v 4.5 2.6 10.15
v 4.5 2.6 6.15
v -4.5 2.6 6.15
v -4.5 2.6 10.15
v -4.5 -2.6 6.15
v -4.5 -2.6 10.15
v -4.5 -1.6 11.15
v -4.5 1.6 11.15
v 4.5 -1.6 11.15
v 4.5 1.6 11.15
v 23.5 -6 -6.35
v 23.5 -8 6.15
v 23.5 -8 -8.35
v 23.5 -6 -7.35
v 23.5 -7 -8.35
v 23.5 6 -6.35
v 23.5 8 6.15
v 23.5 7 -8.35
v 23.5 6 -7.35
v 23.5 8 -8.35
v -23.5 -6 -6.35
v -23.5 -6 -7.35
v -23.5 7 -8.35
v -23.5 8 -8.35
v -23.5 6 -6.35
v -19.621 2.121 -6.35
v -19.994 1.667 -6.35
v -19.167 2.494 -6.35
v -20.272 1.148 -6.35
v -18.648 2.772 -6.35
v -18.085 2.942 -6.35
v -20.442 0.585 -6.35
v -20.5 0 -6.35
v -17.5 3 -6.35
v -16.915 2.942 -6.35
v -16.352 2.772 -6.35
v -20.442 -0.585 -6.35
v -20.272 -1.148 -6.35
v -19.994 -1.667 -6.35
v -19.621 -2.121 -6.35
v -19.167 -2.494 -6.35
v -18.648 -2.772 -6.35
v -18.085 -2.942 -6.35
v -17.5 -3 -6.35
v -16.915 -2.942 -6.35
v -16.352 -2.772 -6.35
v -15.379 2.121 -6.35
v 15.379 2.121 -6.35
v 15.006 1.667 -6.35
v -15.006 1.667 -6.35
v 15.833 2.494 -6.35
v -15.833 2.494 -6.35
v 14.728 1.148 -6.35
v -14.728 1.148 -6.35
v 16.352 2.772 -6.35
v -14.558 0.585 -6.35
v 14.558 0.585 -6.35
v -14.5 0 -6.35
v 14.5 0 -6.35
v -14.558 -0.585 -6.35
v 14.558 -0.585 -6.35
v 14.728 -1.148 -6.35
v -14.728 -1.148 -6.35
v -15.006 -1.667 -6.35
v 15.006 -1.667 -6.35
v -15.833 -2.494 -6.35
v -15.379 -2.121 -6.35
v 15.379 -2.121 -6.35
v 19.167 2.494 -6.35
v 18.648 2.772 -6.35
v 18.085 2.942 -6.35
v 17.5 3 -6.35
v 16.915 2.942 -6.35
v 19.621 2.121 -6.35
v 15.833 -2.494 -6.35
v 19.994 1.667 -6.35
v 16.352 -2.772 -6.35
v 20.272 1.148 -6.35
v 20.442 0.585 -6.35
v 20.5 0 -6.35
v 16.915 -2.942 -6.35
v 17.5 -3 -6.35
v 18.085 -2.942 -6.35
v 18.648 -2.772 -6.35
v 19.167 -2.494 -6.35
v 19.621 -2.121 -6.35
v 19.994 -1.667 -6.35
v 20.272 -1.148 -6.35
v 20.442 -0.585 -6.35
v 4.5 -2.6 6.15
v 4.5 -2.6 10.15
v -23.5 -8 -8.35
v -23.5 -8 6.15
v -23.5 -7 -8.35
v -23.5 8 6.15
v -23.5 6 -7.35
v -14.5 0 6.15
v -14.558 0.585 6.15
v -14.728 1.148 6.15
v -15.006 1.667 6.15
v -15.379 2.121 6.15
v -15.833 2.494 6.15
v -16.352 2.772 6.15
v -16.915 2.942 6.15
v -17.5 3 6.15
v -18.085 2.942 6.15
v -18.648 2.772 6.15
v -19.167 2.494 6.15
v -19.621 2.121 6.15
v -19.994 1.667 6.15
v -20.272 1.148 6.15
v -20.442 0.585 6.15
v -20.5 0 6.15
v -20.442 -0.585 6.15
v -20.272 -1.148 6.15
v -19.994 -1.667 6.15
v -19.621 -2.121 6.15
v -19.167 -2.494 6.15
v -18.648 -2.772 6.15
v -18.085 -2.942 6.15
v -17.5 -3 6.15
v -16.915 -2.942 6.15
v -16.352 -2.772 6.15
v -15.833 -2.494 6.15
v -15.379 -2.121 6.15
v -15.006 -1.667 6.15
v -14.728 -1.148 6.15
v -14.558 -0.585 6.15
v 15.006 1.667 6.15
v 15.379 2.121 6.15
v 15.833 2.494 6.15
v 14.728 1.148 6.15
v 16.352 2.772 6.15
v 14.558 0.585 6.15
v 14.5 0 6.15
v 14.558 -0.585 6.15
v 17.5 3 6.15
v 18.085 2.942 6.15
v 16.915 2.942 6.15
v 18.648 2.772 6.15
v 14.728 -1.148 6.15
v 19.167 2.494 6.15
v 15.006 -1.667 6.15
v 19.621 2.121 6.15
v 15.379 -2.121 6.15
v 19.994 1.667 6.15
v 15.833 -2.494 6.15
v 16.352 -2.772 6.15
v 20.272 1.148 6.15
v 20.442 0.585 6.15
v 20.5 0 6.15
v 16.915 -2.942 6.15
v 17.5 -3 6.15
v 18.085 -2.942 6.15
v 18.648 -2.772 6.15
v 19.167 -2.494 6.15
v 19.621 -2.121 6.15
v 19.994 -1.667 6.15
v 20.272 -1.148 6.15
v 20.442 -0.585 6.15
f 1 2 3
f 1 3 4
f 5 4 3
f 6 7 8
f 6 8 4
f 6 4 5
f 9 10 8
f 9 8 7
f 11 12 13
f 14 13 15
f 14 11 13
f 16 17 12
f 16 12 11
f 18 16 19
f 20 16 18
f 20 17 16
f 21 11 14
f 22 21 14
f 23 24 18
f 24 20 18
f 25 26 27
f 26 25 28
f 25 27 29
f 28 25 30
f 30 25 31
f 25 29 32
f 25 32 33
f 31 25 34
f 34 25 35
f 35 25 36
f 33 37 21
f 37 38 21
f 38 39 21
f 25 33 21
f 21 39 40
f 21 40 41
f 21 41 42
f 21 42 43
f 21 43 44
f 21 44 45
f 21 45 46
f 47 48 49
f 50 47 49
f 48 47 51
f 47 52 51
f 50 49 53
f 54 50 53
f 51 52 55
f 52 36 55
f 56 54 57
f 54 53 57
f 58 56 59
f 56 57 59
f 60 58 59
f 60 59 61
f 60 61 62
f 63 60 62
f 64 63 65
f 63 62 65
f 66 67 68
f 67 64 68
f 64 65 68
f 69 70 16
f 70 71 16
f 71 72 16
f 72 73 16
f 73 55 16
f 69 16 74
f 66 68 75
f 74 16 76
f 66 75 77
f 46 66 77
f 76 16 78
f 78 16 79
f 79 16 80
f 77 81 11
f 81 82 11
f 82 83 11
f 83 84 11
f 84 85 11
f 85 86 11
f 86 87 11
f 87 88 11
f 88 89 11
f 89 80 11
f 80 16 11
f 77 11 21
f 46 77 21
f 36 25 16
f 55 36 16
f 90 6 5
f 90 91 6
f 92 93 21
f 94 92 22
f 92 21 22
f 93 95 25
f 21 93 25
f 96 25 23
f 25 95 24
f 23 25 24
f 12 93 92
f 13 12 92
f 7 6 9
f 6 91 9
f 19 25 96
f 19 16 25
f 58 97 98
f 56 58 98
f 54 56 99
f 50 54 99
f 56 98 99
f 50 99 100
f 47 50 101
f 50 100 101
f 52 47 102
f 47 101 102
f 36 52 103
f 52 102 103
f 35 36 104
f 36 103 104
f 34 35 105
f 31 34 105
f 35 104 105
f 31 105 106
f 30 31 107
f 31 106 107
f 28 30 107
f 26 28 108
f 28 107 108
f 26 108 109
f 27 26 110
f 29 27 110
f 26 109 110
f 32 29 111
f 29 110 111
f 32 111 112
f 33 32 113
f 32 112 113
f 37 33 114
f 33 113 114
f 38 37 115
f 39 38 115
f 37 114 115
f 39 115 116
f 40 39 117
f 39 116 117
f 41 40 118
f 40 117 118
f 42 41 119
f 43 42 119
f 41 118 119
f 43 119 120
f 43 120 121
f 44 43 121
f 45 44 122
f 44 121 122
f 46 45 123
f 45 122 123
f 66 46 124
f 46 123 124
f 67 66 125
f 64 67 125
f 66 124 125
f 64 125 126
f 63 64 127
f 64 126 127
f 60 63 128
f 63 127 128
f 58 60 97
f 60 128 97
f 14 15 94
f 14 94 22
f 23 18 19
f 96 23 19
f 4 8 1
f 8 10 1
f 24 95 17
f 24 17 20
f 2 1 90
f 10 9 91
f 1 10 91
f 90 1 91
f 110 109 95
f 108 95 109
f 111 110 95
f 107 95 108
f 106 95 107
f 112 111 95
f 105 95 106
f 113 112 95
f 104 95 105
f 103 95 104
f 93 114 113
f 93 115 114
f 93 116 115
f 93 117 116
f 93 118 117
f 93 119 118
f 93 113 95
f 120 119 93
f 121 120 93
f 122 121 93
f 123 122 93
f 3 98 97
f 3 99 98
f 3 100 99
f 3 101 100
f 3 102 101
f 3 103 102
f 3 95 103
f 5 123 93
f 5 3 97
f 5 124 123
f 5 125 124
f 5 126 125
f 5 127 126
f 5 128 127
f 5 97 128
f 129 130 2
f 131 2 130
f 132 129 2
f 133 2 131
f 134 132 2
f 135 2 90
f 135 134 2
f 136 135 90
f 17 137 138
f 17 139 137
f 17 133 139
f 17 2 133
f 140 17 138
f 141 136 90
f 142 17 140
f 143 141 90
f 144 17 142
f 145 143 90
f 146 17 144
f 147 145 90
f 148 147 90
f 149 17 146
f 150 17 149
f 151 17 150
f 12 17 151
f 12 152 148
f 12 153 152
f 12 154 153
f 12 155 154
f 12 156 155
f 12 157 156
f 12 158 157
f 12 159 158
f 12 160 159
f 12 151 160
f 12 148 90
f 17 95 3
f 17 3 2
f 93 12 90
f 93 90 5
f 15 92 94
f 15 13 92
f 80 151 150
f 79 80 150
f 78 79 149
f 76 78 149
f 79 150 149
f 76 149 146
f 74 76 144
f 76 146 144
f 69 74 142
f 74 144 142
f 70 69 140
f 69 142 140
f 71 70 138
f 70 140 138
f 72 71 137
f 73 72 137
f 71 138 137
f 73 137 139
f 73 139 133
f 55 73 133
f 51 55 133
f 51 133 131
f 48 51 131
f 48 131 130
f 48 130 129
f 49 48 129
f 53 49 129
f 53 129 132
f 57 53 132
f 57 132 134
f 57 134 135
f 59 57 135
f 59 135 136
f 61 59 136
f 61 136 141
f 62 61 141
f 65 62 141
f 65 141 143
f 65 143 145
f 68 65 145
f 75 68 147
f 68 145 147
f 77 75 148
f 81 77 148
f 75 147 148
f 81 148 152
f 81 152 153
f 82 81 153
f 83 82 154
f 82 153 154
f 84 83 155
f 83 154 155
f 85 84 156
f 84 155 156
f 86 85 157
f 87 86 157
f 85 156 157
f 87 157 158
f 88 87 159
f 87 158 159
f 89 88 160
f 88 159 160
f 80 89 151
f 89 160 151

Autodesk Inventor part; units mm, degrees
ref_plane "YZ Plane" through (0, 0, 0) normal (1, 0, 0) x (0, 1, 0)
ref_plane "XZ Plane" through (0, 0, 0) normal (0, 1, 0) x (-1, 0, 0)
ref_plane "XY Plane" through (0, 0, 0) normal (0, 0, 1) x (1, 0, 0)
ref_plane "작업 평면1" through (23.5, -8, -2) normal (1, 0, 0) x (0, 0, -1)
sketch "스케치1" plane through (23.5, -8, -2) normal (1, 0, 0) x (0, 0, -1)
  line L0 (0, 16) -> (-8.15, 16) projected
  line L1 (-8.15, 16) -> (-8.15, 10.6) projected
  line L2 (-8.15, 10.6) -> (-12.15, 10.6) projected
  line L3 (-13.15, 9.6) -> (-12.15, 10.6) projected
  line L4 (-13.15, 9.6) -> (-13.15, 6.4) projected
  line L5 (-12.15, 5.4) -> (-13.15, 6.4) projected
  line L6 (-12.15, 5.4) -> (-8.15, 5.4) projected
  line L7 (-8.15, 5.4) -> (-8.15, 0) projected
  line L8 (-8.15, 0) -> (0, 0) projected
  line L9 (0, 16) -> (6.35, 16)
  line L10 (6.35, 16) -> (6.35, 15)
  line L11 (6.35, 15) -> (5.35, 14)
  line L12 (4.35, 14) -> (4.35, 2)
  line L13 (4.35, 14) -> (5.35, 14)
  line L14 (0, 0) -> (6.35, 0)
  line L15 (6.35, 0) -> (6.35, 1)
  line L16 (6.35, 1) -> (5.35, 2)
  line L17 (4.35, 2) -> (5.35, 2)
  line L18 (0, 16) -> (-8.15, 16)
  line L19 (-8.15, 10.6) -> (-12.15, 10.6) projected
  line L20 (-8.15, 10.6) -> (-12.15, 10.6)
  line L21 (-12.15, 10.6) -> (-13.15, 9.6)
  line L22 (-13.15, 6.4) -> (-12.15, 5.4)
  point P0 (-2, 8)
  dimension "d1" = 6.35
sketch "스케치2" plane through (-23.5, 8, 6.15) normal (0, 0, 1) x (1, 0, 0)
  arc A0 (7.9209, -9.6) -> (7.9209, -6.4) centre (6, -8) ccw projected
  line L0 (39.0791, -9.6) -> (7.9209, -9.6) projected
  circle A1 centre (6, -8) radius 2.5
  circle A2 centre (41, -8) radius 2.5 projected
  circle A3 centre (41, -8) radius 2.5
  point P0 (23.5, -8)
  point P1 (7.9209, -6.4)
extrude "돌출1" add sketch "스케치1" against normal up to surface (47 mm away)
extrude "돌출2" cut sketch "스케치2" along normal mid plane 50
sketch "스케치3" plane through (-15.5791, 1.6, 11.15) normal (0, 0, 1) x (1, 0, 0)
  line L0 (15.5791, -14.4593) -> (15.5791, 15.5737)
  line L1 (-7.9209, 4.4) -> (-7.9209, -7.6) projected
  line L2 (-7.9209, 4.4) -> (11.0791, 4.4)
  line L3 (11.0791, 4.4) -> (11.0791, -7.6)
  line L4 (11.0791, -7.6) -> (-7.9209, -7.6)
  line L5 (-7.9209, -7.6) -> (-7.9209, 4.4)
  line L6 (39.0791, 4.4) -> (39.0791, -7.6)
  line L7 (39.0791, 4.4) -> (20.0791, 4.4)
  line L8 (20.0791, 4.4) -> (20.0791, -7.6)
  line L9 (20.0791, -7.6) -> (39.0791, -7.6)
  line L10 (39.0791, -7.6) -> (39.0791, 4.4)
  point P0 (15.5791, -1.6)
  dimension "d9" = 19
extrude "돌출3" cut sketch "스케치3" against normal up to surface (5 mm away)
sketch "스케치4" plane through (-23.5, 8, 6.15) normal (0, 0, 1) x (1, 0, 0)
  circle A0 centre (6, -8) radius 2.5 projected
  circle A1 centre (6, -8) radius 3
  circle A2 centre (41, -8) radius 2.5 projected
  circle A3 centre (41, -8) radius 3
  point P0 (23.5, -8)
  dimension "d10" = 6
  dimension "d11" = 6
extrude "돌출4" cut sketch "스케치4" against normal up to surface (12.5 mm away) contours A0 | A1 | A2 | A3
properties part number "Bearing Spacer"
